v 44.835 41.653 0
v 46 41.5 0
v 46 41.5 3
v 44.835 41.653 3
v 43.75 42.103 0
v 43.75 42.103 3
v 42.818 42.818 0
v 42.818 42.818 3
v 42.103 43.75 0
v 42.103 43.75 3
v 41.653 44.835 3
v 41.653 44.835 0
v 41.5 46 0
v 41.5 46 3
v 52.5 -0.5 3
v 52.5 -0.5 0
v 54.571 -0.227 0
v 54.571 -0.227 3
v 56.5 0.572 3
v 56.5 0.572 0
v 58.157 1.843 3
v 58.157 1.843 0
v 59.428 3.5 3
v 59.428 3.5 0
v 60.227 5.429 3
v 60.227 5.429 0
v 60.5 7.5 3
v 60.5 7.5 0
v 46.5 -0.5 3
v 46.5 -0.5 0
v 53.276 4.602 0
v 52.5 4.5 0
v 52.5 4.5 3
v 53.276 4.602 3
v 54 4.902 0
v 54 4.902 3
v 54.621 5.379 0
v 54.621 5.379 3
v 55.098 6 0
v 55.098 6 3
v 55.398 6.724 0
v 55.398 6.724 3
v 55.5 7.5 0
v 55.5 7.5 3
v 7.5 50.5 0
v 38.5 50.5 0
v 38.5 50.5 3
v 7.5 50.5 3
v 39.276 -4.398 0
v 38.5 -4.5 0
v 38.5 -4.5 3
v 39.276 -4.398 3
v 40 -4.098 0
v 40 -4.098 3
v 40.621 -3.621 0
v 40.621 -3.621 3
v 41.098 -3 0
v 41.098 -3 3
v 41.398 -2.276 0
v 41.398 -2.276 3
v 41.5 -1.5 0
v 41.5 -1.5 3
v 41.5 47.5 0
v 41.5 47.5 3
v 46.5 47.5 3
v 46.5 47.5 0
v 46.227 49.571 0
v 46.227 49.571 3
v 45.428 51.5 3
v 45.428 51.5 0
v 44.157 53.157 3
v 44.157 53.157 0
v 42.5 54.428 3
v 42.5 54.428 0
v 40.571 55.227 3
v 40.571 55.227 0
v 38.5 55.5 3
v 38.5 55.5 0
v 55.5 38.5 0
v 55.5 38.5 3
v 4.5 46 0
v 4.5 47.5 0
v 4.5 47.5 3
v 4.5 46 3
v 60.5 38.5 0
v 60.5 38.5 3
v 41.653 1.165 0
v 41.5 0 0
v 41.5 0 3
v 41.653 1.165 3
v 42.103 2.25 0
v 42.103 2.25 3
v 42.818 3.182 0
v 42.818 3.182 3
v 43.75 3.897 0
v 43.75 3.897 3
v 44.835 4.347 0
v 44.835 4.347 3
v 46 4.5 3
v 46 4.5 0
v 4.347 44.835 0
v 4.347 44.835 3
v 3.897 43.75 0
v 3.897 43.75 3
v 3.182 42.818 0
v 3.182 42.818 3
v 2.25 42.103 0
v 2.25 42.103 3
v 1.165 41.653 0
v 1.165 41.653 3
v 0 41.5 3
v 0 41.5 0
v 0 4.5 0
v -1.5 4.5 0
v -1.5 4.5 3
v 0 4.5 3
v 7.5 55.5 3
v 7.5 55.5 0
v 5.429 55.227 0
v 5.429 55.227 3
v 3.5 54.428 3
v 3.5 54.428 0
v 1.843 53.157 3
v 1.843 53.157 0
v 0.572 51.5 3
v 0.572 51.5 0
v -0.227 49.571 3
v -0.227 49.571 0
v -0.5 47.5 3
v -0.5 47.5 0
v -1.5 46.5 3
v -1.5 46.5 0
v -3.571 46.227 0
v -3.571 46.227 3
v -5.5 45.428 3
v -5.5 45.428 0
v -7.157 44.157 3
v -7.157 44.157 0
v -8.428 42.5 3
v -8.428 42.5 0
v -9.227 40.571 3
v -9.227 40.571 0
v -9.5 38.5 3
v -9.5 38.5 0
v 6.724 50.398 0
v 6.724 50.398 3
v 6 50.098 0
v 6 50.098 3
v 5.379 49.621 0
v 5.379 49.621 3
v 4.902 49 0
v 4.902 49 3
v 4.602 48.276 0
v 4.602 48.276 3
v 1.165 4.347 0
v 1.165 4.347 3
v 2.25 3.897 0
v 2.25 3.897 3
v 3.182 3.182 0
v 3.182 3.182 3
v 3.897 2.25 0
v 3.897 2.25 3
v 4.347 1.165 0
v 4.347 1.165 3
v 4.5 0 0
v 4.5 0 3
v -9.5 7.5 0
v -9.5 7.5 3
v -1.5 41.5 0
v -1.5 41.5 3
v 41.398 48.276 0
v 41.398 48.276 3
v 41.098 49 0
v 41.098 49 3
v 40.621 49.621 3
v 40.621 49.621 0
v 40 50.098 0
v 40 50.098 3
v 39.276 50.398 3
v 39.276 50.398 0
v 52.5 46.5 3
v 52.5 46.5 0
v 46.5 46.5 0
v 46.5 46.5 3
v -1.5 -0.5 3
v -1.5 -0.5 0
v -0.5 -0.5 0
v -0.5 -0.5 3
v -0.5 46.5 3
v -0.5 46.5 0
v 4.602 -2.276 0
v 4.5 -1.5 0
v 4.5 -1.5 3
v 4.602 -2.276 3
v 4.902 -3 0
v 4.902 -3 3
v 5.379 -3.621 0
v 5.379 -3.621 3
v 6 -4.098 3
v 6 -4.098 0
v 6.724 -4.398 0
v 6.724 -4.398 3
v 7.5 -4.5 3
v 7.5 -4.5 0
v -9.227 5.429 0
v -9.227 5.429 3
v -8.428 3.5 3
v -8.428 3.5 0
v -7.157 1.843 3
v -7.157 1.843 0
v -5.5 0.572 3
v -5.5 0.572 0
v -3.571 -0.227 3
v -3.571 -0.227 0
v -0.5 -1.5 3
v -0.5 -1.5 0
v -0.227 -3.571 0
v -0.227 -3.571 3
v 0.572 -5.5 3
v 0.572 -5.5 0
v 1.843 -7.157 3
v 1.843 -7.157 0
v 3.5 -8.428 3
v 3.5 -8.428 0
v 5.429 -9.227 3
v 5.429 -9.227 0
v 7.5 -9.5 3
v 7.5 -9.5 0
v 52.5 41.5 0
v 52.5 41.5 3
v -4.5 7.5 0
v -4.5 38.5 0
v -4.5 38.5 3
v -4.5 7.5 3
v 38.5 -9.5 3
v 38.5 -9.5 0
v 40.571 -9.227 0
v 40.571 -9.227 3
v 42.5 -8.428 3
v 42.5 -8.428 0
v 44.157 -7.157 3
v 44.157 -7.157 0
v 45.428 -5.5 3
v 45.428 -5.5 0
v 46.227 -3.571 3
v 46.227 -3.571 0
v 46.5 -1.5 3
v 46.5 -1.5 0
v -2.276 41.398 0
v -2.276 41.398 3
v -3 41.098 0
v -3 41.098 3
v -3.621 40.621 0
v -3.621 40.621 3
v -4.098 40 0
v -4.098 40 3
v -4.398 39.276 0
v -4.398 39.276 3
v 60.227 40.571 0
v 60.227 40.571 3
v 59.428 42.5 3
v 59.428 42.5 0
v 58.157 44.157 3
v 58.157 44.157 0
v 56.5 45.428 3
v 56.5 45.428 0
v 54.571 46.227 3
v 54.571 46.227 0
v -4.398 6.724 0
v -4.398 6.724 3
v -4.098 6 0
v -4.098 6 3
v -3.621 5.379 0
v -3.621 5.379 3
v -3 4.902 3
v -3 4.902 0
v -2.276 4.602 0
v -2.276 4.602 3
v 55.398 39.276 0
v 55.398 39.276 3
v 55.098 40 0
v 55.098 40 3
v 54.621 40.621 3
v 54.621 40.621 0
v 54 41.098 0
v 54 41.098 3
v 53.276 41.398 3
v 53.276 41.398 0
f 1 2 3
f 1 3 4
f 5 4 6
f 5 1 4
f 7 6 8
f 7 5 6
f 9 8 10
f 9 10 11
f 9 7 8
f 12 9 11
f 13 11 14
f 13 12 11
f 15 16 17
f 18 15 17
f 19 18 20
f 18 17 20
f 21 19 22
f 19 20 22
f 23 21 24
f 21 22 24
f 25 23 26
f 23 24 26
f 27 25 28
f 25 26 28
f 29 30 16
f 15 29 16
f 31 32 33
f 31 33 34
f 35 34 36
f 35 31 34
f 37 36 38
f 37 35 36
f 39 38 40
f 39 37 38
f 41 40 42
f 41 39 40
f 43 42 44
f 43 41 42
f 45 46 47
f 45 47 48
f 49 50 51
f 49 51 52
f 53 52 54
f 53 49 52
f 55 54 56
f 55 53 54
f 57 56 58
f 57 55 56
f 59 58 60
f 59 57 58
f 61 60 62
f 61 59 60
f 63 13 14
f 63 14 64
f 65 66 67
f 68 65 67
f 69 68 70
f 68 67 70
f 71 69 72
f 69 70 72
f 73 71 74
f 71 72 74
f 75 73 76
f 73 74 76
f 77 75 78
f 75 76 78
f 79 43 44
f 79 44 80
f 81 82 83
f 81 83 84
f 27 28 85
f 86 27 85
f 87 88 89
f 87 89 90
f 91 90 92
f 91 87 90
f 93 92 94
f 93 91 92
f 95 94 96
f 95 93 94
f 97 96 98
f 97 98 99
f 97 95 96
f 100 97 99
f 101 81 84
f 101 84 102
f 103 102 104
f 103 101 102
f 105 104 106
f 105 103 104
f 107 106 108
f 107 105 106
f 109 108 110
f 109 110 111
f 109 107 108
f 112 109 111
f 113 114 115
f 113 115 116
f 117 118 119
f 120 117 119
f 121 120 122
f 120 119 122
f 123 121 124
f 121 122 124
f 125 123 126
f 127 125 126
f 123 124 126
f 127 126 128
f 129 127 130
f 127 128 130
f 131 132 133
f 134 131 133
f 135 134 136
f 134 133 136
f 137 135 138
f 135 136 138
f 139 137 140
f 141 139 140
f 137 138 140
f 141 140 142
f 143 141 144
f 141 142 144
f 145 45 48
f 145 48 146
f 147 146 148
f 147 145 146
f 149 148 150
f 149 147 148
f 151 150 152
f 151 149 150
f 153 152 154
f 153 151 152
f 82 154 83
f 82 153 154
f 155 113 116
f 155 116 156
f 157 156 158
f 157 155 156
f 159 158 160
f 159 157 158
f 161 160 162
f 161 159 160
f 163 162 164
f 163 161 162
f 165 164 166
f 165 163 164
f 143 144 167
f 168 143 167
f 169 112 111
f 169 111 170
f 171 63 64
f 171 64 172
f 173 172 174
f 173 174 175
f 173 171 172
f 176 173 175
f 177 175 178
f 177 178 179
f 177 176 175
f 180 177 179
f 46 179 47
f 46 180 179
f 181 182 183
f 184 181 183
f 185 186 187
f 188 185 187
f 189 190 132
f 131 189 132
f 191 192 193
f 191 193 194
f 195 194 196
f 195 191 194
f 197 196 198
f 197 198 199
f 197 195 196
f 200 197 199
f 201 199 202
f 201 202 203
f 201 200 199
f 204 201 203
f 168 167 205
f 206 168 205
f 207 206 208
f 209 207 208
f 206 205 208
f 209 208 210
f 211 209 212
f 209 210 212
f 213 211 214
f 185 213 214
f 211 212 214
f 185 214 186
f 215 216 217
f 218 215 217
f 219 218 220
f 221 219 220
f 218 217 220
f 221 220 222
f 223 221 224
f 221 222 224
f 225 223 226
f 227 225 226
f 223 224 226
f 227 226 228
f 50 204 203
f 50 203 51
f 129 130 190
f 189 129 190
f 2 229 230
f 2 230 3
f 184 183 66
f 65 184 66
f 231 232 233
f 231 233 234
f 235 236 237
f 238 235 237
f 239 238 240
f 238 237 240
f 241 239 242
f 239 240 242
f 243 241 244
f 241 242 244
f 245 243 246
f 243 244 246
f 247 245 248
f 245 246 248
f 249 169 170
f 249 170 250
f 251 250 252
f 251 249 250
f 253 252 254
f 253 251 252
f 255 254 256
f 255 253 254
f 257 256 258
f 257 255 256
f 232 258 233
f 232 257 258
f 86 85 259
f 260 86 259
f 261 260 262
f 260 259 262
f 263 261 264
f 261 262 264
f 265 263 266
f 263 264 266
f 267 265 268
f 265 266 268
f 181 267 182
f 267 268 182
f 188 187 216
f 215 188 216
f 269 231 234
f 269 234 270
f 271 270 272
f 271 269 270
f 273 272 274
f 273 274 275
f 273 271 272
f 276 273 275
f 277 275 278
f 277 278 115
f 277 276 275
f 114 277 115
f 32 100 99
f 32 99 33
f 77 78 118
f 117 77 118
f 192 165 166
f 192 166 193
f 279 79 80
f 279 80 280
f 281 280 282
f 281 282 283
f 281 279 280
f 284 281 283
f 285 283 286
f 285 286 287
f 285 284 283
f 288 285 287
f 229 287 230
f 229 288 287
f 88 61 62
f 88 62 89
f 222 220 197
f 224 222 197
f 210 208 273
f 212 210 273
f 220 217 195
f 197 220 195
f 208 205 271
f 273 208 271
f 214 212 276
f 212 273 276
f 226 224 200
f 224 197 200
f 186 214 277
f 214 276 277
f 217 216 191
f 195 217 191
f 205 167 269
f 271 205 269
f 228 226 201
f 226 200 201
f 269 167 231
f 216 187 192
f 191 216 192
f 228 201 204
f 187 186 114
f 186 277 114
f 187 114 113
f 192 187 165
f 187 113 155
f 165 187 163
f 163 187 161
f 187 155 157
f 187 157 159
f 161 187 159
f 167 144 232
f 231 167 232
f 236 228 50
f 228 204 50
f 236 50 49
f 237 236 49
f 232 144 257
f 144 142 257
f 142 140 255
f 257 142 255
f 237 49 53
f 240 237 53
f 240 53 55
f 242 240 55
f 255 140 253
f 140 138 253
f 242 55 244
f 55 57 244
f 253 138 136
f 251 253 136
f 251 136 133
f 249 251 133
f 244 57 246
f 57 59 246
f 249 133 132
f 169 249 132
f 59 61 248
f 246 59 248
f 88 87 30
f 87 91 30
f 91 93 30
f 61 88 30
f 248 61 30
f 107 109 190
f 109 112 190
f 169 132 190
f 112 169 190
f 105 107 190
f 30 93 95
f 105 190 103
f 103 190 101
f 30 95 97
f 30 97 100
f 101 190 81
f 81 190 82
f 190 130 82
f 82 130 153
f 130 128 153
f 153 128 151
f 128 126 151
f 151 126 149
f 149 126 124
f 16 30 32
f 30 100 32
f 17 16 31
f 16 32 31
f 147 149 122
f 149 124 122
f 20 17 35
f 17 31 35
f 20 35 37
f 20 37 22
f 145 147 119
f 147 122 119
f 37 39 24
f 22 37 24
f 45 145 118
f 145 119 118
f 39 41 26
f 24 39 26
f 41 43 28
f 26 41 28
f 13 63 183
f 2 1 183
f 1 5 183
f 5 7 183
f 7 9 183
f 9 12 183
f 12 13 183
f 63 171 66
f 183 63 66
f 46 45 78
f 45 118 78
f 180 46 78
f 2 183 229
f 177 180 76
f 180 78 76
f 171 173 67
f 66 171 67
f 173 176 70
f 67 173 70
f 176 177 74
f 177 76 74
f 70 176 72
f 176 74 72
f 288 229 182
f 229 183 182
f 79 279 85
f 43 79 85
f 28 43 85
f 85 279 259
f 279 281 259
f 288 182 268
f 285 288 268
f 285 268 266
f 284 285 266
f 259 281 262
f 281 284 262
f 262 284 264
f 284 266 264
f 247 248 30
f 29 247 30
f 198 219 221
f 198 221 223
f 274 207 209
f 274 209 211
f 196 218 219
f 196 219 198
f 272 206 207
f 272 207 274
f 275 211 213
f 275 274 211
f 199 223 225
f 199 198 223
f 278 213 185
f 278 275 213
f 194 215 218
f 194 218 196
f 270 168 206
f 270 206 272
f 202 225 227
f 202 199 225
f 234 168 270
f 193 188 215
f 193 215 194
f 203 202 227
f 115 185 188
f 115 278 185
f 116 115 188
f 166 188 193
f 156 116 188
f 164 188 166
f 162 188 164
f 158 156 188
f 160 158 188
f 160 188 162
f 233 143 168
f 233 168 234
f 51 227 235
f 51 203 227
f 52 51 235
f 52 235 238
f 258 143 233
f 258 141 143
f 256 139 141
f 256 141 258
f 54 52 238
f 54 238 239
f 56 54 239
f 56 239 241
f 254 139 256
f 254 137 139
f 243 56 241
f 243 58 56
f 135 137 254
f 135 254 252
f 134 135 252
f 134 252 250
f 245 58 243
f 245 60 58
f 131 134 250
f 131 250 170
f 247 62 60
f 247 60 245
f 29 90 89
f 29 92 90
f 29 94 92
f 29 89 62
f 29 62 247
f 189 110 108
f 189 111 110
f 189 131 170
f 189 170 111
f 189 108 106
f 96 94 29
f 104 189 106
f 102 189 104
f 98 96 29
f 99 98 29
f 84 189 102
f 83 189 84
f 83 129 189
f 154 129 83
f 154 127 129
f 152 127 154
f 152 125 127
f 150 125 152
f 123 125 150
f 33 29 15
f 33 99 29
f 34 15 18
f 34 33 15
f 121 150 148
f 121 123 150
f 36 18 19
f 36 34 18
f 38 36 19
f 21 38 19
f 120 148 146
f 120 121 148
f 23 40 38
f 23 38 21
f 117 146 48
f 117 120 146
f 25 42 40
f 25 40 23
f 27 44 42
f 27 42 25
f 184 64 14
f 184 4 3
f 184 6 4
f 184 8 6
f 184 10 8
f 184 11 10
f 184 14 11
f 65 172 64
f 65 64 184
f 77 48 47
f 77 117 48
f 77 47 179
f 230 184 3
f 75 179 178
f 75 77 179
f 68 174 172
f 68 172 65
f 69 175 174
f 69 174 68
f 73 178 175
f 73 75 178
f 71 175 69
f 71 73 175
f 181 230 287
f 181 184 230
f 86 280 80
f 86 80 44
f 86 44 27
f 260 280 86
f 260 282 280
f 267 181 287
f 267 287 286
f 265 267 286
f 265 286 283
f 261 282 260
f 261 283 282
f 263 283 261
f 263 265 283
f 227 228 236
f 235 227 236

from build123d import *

# Parameters (mm, degrees)
RESSALTO_EXTRUS_O1_DEPTH = 3


with BuildPart() as part:
    # Esboço1 → Ressalto-extrusão1 (new body)
    with BuildSketch(Plane.XY):
        with BuildLine():
            Line((46.5, -1.5), (46.5, -0.5))
            Line((46.5, -0.5), (52.5, -0.5))
            ThreePointArc((52.5, -0.5), (58.156854249, 1.843145751), (60.5, 7.5))
            Line((60.5, 7.5), (60.5, 38.5))
            ThreePointArc((60.5, 38.5), (58.156854249, 44.156854249), (52.5, 46.5))
            Line((52.5, 46.5), (46.5, 46.5))
            Line((46.5, 46.5), (46.5, 47.5))
            ThreePointArc((46.5, 47.5), (44.156854249, 53.156854249), (38.5, 55.5))
            Line((38.5, 55.5), (7.5, 55.5))
            ThreePointArc((7.5, 55.5), (1.843145751, 53.156854249), (-0.5, 47.5))
            Line((-0.5, 47.5), (-0.5, 46.5))
            Line((-0.5, 46.5), (-1.5, 46.5))
            ThreePointArc((-1.5, 46.5), (-7.156854249, 44.156854249), (-9.5, 38.5))
            Line((-9.5, 38.5), (-9.5, 7.5))
            ThreePointArc((-9.5, 7.5), (-7.156854249, 1.843145751), (-1.5, -0.5))
            Line((-1.5, -0.5), (-0.5, -0.5))
            Line((-0.5, -0.5), (-0.5, -1.5))
            ThreePointArc((-0.5, -1.5), (1.843145751, -7.156854249), (7.5, -9.5))
            Line((7.5, -9.5), (38.5, -9.5))
            ThreePointArc((38.5, -9.5), (44.156854249, -7.156854249), (46.5, -1.5))
        make_face()
        with BuildLine():
            Line((41.5, -1.5), (41.5, 0))
            ThreePointArc((41.5, 0), (42.818019485, 3.181980515), (46, 4.5))
            Line((46, 4.5), (52.5, 4.5))
            ThreePointArc((52.5, 4.5), (54.621320344, 5.378679656), (55.5, 7.5))
            Line((55.5, 7.5), (55.5, 38.5))
            ThreePointArc((55.5, 38.5), (54.621320344, 40.621320344), (52.5, 41.5))
            Line((52.5, 41.5), (46, 41.5))
            ThreePointArc((46, 41.5), (42.818019485, 42.818019485), (41.5, 46))
            Line((41.5, 46), (41.5, 47.5))
            ThreePointArc((41.5, 47.5), (40.621320344, 49.621320344), (38.5, 50.5))
            Line((38.5, 50.5), (7.5, 50.5))
            ThreePointArc((7.5, 50.5), (5.378679656, 49.621320344), (4.5, 47.5))
            Line((4.5, 47.5), (4.5, 46))
            ThreePointArc((4.5, 46), (3.181980515, 42.818019485), (0, 41.5))
            Line((0, 41.5), (-1.5, 41.5))
            ThreePointArc((-1.5, 41.5), (-3.621320344, 40.621320344), (-4.5, 38.5))
            Line((-4.5, 38.5), (-4.5, 7.5))
            ThreePointArc((-4.5, 7.5), (-3.621320344, 5.378679656), (-1.5, 4.5))
            Line((-1.5, 4.5), (0, 4.5))
            ThreePointArc((0, 4.5), (3.181980515, 3.181980515), (4.5, 0))
            Line((4.5, 0), (4.5, -1.5))
            ThreePointArc((4.5, -1.5), (5.378679656, -3.621320344), (7.5, -4.5))
            Line((7.5, -4.5), (38.5, -4.5))
            ThreePointArc((38.5, -4.5), (40.621320344, -3.621320344), (41.5, -1.5))
        make_face(mode=Mode.SUBTRACT)
    extrude(amount=RESSALTO_EXTRUS_O1_DEPTH)


solid = part.part
